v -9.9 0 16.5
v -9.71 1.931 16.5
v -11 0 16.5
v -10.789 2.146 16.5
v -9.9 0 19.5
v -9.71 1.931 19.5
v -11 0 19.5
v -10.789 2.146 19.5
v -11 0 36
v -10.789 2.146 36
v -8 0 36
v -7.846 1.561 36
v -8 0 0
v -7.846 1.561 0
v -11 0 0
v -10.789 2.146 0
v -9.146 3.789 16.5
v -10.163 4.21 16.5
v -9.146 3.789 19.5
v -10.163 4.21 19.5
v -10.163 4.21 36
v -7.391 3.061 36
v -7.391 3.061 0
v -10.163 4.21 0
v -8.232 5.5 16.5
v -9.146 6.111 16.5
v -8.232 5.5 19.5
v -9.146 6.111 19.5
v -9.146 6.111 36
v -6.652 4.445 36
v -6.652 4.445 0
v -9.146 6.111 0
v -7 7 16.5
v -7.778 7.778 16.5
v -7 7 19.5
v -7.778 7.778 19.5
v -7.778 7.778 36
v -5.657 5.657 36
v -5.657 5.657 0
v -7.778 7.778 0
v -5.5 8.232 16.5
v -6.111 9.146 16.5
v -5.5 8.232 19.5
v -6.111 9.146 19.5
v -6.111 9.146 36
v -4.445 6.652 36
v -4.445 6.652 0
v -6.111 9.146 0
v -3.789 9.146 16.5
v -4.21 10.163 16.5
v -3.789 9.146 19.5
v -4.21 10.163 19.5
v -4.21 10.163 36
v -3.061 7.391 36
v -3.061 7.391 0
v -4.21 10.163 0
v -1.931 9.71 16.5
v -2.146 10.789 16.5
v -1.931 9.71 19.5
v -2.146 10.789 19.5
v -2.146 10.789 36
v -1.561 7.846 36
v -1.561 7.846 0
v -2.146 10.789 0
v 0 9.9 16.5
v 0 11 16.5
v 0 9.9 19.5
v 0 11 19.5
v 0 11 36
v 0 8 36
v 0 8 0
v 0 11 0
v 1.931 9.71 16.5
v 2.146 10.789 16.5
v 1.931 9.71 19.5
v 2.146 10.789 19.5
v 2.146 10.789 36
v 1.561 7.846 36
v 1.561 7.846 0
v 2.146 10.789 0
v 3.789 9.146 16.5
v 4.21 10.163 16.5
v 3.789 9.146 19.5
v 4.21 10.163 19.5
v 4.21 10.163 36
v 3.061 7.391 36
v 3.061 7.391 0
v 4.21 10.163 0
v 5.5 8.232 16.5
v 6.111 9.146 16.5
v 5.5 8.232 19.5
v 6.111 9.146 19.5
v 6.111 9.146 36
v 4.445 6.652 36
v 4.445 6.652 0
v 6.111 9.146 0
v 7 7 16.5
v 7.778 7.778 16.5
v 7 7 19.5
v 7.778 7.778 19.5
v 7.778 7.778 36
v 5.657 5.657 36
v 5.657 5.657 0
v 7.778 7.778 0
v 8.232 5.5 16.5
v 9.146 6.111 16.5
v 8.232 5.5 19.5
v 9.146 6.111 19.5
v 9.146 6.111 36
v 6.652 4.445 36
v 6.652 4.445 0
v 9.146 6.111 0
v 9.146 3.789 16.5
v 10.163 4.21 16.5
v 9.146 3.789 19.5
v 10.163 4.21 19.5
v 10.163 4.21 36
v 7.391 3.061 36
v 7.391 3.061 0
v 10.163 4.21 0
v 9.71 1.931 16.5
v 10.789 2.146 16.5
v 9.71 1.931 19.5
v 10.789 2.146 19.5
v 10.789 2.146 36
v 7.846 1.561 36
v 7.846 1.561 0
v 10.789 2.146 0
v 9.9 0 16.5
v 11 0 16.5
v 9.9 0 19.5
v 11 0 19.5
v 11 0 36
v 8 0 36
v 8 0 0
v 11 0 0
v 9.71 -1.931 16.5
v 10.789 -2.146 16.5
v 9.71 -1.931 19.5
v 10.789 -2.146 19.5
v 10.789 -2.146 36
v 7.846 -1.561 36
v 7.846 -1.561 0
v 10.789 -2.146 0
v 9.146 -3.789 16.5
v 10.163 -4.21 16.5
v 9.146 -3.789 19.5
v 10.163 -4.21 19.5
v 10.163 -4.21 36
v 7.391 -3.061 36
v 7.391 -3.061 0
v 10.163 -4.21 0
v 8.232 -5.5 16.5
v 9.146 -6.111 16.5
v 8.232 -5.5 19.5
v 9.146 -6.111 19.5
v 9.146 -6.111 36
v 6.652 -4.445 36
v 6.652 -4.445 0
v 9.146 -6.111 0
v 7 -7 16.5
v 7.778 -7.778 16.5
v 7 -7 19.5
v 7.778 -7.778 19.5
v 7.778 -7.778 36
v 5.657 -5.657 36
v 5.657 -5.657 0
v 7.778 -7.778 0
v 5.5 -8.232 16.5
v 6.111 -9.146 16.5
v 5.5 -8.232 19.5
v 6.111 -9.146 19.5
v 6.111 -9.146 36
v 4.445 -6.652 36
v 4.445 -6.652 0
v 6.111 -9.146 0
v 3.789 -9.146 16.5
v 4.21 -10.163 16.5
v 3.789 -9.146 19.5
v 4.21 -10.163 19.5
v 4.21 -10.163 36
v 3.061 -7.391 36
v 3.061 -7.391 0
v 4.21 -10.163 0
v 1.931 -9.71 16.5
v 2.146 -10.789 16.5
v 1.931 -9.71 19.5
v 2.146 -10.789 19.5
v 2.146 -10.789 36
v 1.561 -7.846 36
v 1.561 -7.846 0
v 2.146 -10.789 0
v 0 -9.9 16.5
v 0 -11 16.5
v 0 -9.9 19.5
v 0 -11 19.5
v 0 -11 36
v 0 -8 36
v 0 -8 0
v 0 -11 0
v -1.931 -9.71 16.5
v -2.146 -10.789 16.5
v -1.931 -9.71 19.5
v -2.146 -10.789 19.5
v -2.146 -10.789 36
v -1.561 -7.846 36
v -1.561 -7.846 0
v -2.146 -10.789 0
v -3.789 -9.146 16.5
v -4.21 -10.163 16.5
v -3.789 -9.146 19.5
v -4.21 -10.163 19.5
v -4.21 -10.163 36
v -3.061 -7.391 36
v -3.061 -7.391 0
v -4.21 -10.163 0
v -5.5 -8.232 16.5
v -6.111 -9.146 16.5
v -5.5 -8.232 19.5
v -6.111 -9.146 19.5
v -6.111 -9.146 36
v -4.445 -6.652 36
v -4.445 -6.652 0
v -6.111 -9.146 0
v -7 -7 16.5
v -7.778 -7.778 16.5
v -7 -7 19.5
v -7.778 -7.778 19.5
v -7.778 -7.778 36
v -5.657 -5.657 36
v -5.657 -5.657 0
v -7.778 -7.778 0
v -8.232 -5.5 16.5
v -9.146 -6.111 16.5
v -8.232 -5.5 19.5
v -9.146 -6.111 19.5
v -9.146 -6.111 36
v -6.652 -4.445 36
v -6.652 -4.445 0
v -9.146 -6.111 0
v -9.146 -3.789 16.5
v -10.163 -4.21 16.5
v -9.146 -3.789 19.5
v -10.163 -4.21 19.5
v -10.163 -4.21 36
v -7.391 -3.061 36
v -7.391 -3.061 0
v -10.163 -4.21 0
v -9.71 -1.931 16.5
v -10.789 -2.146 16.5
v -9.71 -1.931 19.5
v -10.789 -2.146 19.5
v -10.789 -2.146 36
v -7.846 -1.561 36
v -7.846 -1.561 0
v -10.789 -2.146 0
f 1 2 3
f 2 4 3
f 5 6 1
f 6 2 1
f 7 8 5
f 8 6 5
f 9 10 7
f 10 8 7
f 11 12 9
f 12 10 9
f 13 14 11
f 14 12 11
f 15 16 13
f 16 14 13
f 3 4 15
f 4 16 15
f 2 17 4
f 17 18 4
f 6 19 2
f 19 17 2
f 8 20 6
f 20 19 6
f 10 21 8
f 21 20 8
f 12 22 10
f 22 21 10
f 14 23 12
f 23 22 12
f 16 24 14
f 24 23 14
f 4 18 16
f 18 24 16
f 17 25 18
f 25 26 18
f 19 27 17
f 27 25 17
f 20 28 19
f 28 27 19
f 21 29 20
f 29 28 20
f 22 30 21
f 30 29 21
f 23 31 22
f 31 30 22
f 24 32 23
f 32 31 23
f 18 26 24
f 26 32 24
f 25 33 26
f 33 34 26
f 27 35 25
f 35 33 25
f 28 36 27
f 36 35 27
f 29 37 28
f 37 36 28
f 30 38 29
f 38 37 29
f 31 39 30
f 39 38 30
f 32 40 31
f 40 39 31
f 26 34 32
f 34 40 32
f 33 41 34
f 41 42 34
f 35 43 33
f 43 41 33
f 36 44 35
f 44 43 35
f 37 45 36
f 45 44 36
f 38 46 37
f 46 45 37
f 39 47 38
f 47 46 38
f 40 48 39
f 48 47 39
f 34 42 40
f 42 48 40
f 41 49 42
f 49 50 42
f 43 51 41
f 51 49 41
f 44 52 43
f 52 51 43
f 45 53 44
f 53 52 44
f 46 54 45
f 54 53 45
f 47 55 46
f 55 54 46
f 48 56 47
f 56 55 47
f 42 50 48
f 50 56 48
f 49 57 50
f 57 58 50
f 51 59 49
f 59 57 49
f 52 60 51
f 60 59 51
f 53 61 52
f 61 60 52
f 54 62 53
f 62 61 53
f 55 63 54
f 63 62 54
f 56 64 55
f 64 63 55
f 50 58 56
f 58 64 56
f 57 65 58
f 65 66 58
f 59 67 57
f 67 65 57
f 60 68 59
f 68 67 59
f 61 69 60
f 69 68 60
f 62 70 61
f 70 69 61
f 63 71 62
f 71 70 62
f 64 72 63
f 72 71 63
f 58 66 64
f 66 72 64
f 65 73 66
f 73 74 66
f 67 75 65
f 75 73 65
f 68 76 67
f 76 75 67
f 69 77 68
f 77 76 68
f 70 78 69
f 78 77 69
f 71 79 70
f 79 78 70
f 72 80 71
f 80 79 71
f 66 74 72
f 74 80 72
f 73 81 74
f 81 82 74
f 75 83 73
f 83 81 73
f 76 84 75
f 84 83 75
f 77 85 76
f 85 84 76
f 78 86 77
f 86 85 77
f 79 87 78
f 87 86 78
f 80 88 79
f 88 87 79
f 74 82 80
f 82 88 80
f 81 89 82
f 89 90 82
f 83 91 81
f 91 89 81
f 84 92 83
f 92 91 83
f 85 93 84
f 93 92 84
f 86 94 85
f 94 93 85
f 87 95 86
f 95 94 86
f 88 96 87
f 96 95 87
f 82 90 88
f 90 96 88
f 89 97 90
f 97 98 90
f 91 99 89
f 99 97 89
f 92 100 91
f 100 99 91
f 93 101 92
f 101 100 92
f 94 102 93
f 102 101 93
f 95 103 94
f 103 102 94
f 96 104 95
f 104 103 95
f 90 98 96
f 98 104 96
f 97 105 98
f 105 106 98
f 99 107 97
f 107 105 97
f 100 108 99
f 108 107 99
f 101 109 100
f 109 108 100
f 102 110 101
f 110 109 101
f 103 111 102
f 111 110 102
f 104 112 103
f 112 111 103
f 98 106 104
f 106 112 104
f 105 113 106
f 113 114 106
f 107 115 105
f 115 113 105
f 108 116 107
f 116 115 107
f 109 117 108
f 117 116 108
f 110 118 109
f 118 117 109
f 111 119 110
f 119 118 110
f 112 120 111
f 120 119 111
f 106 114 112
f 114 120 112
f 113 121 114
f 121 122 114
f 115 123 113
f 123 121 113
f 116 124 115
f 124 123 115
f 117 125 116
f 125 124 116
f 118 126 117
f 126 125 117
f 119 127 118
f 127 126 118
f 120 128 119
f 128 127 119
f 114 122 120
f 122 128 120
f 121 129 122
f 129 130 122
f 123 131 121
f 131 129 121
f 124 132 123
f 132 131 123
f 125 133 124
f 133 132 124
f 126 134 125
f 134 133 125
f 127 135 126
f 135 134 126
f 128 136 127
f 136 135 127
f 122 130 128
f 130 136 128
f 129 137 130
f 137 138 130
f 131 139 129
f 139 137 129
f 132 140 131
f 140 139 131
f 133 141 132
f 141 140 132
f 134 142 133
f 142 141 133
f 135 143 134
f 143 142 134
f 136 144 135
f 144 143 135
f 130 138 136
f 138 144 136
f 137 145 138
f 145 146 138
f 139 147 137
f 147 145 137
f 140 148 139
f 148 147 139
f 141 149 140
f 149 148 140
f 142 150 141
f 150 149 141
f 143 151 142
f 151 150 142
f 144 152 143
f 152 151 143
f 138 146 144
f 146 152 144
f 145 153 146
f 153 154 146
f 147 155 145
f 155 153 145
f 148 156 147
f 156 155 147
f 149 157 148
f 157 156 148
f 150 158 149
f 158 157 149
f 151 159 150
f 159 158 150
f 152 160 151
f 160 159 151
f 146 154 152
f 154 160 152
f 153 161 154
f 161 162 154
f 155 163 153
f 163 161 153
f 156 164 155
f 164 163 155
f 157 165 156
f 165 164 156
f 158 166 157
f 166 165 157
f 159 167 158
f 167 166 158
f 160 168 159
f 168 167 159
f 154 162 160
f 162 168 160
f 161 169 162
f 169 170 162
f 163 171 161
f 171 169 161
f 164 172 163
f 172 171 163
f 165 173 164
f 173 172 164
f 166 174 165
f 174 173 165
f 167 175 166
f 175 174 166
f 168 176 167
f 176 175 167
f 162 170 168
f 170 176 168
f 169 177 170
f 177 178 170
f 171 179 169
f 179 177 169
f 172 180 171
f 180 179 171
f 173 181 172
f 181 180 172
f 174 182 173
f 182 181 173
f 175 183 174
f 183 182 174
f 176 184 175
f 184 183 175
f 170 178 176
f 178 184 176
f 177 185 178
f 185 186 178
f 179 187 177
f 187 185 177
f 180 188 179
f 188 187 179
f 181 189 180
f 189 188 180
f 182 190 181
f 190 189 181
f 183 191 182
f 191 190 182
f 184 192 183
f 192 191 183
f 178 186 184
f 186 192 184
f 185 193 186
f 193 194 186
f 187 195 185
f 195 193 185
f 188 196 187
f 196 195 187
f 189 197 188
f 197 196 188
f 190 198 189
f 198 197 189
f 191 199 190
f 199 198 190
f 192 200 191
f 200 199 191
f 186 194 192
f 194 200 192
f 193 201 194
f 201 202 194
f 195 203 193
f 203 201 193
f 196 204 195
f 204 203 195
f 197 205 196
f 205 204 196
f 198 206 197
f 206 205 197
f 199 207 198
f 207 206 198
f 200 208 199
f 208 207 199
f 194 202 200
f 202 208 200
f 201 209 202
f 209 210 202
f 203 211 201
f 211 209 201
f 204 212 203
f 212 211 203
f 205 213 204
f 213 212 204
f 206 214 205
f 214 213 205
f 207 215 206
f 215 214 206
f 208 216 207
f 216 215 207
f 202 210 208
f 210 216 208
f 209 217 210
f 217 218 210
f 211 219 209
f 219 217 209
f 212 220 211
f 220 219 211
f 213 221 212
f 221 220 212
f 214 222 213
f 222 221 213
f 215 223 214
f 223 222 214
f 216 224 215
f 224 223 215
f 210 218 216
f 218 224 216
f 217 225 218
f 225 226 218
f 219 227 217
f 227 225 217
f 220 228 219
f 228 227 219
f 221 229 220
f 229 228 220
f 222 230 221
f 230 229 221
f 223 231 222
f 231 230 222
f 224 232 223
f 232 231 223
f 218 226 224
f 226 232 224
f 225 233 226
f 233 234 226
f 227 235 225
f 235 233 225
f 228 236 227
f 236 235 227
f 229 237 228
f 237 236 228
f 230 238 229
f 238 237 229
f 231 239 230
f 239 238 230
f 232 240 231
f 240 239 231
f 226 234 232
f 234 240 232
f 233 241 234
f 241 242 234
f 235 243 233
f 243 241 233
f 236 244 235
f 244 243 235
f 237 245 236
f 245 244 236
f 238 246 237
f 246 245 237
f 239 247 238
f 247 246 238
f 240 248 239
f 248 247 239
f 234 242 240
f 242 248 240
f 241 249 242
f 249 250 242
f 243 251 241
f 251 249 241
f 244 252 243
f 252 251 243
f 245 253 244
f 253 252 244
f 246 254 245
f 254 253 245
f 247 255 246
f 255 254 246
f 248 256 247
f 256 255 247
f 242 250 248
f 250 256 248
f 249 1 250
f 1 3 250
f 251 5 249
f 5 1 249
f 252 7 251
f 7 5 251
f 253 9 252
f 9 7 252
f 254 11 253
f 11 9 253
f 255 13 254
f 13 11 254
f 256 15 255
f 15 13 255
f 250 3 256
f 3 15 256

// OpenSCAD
$fn = 32;

// ----------------------------------------------------------------------
// Grooved revolve: stepped, bore R8
// ----------------------------------------------------------------------

// --- parameters (mm) ---
bore_r = 8;               // bore radius
outer_r = 11;             // outer radius of the body
total_h = 36;             // overall height, Z
wall = 3;                 // radial wall thickness
groove_w = 3;             // groove width
groove_d = 1.1;           // groove depth
grooves = 1;              // number of outer grooves

bbox_x = 2 * outer_r;  // full diameter
bore_d = 2 * bore_r;  // bore diameter
body_d = 2 * outer_r;  // body diameter
revolve_angle = 360;  // full turn around the Z axis

profile = [[8, 0], [11, 0], [11, 16.5], [9.9, 16.5], [9.9, 19.5], [11, 19.5], [11, 36], [8, 36]];  // primary outline, 8 points, counter clockwise

// --- the one profile operation ---
rotate_extrude(angle = revolve_angle) polygon(points = profile);
